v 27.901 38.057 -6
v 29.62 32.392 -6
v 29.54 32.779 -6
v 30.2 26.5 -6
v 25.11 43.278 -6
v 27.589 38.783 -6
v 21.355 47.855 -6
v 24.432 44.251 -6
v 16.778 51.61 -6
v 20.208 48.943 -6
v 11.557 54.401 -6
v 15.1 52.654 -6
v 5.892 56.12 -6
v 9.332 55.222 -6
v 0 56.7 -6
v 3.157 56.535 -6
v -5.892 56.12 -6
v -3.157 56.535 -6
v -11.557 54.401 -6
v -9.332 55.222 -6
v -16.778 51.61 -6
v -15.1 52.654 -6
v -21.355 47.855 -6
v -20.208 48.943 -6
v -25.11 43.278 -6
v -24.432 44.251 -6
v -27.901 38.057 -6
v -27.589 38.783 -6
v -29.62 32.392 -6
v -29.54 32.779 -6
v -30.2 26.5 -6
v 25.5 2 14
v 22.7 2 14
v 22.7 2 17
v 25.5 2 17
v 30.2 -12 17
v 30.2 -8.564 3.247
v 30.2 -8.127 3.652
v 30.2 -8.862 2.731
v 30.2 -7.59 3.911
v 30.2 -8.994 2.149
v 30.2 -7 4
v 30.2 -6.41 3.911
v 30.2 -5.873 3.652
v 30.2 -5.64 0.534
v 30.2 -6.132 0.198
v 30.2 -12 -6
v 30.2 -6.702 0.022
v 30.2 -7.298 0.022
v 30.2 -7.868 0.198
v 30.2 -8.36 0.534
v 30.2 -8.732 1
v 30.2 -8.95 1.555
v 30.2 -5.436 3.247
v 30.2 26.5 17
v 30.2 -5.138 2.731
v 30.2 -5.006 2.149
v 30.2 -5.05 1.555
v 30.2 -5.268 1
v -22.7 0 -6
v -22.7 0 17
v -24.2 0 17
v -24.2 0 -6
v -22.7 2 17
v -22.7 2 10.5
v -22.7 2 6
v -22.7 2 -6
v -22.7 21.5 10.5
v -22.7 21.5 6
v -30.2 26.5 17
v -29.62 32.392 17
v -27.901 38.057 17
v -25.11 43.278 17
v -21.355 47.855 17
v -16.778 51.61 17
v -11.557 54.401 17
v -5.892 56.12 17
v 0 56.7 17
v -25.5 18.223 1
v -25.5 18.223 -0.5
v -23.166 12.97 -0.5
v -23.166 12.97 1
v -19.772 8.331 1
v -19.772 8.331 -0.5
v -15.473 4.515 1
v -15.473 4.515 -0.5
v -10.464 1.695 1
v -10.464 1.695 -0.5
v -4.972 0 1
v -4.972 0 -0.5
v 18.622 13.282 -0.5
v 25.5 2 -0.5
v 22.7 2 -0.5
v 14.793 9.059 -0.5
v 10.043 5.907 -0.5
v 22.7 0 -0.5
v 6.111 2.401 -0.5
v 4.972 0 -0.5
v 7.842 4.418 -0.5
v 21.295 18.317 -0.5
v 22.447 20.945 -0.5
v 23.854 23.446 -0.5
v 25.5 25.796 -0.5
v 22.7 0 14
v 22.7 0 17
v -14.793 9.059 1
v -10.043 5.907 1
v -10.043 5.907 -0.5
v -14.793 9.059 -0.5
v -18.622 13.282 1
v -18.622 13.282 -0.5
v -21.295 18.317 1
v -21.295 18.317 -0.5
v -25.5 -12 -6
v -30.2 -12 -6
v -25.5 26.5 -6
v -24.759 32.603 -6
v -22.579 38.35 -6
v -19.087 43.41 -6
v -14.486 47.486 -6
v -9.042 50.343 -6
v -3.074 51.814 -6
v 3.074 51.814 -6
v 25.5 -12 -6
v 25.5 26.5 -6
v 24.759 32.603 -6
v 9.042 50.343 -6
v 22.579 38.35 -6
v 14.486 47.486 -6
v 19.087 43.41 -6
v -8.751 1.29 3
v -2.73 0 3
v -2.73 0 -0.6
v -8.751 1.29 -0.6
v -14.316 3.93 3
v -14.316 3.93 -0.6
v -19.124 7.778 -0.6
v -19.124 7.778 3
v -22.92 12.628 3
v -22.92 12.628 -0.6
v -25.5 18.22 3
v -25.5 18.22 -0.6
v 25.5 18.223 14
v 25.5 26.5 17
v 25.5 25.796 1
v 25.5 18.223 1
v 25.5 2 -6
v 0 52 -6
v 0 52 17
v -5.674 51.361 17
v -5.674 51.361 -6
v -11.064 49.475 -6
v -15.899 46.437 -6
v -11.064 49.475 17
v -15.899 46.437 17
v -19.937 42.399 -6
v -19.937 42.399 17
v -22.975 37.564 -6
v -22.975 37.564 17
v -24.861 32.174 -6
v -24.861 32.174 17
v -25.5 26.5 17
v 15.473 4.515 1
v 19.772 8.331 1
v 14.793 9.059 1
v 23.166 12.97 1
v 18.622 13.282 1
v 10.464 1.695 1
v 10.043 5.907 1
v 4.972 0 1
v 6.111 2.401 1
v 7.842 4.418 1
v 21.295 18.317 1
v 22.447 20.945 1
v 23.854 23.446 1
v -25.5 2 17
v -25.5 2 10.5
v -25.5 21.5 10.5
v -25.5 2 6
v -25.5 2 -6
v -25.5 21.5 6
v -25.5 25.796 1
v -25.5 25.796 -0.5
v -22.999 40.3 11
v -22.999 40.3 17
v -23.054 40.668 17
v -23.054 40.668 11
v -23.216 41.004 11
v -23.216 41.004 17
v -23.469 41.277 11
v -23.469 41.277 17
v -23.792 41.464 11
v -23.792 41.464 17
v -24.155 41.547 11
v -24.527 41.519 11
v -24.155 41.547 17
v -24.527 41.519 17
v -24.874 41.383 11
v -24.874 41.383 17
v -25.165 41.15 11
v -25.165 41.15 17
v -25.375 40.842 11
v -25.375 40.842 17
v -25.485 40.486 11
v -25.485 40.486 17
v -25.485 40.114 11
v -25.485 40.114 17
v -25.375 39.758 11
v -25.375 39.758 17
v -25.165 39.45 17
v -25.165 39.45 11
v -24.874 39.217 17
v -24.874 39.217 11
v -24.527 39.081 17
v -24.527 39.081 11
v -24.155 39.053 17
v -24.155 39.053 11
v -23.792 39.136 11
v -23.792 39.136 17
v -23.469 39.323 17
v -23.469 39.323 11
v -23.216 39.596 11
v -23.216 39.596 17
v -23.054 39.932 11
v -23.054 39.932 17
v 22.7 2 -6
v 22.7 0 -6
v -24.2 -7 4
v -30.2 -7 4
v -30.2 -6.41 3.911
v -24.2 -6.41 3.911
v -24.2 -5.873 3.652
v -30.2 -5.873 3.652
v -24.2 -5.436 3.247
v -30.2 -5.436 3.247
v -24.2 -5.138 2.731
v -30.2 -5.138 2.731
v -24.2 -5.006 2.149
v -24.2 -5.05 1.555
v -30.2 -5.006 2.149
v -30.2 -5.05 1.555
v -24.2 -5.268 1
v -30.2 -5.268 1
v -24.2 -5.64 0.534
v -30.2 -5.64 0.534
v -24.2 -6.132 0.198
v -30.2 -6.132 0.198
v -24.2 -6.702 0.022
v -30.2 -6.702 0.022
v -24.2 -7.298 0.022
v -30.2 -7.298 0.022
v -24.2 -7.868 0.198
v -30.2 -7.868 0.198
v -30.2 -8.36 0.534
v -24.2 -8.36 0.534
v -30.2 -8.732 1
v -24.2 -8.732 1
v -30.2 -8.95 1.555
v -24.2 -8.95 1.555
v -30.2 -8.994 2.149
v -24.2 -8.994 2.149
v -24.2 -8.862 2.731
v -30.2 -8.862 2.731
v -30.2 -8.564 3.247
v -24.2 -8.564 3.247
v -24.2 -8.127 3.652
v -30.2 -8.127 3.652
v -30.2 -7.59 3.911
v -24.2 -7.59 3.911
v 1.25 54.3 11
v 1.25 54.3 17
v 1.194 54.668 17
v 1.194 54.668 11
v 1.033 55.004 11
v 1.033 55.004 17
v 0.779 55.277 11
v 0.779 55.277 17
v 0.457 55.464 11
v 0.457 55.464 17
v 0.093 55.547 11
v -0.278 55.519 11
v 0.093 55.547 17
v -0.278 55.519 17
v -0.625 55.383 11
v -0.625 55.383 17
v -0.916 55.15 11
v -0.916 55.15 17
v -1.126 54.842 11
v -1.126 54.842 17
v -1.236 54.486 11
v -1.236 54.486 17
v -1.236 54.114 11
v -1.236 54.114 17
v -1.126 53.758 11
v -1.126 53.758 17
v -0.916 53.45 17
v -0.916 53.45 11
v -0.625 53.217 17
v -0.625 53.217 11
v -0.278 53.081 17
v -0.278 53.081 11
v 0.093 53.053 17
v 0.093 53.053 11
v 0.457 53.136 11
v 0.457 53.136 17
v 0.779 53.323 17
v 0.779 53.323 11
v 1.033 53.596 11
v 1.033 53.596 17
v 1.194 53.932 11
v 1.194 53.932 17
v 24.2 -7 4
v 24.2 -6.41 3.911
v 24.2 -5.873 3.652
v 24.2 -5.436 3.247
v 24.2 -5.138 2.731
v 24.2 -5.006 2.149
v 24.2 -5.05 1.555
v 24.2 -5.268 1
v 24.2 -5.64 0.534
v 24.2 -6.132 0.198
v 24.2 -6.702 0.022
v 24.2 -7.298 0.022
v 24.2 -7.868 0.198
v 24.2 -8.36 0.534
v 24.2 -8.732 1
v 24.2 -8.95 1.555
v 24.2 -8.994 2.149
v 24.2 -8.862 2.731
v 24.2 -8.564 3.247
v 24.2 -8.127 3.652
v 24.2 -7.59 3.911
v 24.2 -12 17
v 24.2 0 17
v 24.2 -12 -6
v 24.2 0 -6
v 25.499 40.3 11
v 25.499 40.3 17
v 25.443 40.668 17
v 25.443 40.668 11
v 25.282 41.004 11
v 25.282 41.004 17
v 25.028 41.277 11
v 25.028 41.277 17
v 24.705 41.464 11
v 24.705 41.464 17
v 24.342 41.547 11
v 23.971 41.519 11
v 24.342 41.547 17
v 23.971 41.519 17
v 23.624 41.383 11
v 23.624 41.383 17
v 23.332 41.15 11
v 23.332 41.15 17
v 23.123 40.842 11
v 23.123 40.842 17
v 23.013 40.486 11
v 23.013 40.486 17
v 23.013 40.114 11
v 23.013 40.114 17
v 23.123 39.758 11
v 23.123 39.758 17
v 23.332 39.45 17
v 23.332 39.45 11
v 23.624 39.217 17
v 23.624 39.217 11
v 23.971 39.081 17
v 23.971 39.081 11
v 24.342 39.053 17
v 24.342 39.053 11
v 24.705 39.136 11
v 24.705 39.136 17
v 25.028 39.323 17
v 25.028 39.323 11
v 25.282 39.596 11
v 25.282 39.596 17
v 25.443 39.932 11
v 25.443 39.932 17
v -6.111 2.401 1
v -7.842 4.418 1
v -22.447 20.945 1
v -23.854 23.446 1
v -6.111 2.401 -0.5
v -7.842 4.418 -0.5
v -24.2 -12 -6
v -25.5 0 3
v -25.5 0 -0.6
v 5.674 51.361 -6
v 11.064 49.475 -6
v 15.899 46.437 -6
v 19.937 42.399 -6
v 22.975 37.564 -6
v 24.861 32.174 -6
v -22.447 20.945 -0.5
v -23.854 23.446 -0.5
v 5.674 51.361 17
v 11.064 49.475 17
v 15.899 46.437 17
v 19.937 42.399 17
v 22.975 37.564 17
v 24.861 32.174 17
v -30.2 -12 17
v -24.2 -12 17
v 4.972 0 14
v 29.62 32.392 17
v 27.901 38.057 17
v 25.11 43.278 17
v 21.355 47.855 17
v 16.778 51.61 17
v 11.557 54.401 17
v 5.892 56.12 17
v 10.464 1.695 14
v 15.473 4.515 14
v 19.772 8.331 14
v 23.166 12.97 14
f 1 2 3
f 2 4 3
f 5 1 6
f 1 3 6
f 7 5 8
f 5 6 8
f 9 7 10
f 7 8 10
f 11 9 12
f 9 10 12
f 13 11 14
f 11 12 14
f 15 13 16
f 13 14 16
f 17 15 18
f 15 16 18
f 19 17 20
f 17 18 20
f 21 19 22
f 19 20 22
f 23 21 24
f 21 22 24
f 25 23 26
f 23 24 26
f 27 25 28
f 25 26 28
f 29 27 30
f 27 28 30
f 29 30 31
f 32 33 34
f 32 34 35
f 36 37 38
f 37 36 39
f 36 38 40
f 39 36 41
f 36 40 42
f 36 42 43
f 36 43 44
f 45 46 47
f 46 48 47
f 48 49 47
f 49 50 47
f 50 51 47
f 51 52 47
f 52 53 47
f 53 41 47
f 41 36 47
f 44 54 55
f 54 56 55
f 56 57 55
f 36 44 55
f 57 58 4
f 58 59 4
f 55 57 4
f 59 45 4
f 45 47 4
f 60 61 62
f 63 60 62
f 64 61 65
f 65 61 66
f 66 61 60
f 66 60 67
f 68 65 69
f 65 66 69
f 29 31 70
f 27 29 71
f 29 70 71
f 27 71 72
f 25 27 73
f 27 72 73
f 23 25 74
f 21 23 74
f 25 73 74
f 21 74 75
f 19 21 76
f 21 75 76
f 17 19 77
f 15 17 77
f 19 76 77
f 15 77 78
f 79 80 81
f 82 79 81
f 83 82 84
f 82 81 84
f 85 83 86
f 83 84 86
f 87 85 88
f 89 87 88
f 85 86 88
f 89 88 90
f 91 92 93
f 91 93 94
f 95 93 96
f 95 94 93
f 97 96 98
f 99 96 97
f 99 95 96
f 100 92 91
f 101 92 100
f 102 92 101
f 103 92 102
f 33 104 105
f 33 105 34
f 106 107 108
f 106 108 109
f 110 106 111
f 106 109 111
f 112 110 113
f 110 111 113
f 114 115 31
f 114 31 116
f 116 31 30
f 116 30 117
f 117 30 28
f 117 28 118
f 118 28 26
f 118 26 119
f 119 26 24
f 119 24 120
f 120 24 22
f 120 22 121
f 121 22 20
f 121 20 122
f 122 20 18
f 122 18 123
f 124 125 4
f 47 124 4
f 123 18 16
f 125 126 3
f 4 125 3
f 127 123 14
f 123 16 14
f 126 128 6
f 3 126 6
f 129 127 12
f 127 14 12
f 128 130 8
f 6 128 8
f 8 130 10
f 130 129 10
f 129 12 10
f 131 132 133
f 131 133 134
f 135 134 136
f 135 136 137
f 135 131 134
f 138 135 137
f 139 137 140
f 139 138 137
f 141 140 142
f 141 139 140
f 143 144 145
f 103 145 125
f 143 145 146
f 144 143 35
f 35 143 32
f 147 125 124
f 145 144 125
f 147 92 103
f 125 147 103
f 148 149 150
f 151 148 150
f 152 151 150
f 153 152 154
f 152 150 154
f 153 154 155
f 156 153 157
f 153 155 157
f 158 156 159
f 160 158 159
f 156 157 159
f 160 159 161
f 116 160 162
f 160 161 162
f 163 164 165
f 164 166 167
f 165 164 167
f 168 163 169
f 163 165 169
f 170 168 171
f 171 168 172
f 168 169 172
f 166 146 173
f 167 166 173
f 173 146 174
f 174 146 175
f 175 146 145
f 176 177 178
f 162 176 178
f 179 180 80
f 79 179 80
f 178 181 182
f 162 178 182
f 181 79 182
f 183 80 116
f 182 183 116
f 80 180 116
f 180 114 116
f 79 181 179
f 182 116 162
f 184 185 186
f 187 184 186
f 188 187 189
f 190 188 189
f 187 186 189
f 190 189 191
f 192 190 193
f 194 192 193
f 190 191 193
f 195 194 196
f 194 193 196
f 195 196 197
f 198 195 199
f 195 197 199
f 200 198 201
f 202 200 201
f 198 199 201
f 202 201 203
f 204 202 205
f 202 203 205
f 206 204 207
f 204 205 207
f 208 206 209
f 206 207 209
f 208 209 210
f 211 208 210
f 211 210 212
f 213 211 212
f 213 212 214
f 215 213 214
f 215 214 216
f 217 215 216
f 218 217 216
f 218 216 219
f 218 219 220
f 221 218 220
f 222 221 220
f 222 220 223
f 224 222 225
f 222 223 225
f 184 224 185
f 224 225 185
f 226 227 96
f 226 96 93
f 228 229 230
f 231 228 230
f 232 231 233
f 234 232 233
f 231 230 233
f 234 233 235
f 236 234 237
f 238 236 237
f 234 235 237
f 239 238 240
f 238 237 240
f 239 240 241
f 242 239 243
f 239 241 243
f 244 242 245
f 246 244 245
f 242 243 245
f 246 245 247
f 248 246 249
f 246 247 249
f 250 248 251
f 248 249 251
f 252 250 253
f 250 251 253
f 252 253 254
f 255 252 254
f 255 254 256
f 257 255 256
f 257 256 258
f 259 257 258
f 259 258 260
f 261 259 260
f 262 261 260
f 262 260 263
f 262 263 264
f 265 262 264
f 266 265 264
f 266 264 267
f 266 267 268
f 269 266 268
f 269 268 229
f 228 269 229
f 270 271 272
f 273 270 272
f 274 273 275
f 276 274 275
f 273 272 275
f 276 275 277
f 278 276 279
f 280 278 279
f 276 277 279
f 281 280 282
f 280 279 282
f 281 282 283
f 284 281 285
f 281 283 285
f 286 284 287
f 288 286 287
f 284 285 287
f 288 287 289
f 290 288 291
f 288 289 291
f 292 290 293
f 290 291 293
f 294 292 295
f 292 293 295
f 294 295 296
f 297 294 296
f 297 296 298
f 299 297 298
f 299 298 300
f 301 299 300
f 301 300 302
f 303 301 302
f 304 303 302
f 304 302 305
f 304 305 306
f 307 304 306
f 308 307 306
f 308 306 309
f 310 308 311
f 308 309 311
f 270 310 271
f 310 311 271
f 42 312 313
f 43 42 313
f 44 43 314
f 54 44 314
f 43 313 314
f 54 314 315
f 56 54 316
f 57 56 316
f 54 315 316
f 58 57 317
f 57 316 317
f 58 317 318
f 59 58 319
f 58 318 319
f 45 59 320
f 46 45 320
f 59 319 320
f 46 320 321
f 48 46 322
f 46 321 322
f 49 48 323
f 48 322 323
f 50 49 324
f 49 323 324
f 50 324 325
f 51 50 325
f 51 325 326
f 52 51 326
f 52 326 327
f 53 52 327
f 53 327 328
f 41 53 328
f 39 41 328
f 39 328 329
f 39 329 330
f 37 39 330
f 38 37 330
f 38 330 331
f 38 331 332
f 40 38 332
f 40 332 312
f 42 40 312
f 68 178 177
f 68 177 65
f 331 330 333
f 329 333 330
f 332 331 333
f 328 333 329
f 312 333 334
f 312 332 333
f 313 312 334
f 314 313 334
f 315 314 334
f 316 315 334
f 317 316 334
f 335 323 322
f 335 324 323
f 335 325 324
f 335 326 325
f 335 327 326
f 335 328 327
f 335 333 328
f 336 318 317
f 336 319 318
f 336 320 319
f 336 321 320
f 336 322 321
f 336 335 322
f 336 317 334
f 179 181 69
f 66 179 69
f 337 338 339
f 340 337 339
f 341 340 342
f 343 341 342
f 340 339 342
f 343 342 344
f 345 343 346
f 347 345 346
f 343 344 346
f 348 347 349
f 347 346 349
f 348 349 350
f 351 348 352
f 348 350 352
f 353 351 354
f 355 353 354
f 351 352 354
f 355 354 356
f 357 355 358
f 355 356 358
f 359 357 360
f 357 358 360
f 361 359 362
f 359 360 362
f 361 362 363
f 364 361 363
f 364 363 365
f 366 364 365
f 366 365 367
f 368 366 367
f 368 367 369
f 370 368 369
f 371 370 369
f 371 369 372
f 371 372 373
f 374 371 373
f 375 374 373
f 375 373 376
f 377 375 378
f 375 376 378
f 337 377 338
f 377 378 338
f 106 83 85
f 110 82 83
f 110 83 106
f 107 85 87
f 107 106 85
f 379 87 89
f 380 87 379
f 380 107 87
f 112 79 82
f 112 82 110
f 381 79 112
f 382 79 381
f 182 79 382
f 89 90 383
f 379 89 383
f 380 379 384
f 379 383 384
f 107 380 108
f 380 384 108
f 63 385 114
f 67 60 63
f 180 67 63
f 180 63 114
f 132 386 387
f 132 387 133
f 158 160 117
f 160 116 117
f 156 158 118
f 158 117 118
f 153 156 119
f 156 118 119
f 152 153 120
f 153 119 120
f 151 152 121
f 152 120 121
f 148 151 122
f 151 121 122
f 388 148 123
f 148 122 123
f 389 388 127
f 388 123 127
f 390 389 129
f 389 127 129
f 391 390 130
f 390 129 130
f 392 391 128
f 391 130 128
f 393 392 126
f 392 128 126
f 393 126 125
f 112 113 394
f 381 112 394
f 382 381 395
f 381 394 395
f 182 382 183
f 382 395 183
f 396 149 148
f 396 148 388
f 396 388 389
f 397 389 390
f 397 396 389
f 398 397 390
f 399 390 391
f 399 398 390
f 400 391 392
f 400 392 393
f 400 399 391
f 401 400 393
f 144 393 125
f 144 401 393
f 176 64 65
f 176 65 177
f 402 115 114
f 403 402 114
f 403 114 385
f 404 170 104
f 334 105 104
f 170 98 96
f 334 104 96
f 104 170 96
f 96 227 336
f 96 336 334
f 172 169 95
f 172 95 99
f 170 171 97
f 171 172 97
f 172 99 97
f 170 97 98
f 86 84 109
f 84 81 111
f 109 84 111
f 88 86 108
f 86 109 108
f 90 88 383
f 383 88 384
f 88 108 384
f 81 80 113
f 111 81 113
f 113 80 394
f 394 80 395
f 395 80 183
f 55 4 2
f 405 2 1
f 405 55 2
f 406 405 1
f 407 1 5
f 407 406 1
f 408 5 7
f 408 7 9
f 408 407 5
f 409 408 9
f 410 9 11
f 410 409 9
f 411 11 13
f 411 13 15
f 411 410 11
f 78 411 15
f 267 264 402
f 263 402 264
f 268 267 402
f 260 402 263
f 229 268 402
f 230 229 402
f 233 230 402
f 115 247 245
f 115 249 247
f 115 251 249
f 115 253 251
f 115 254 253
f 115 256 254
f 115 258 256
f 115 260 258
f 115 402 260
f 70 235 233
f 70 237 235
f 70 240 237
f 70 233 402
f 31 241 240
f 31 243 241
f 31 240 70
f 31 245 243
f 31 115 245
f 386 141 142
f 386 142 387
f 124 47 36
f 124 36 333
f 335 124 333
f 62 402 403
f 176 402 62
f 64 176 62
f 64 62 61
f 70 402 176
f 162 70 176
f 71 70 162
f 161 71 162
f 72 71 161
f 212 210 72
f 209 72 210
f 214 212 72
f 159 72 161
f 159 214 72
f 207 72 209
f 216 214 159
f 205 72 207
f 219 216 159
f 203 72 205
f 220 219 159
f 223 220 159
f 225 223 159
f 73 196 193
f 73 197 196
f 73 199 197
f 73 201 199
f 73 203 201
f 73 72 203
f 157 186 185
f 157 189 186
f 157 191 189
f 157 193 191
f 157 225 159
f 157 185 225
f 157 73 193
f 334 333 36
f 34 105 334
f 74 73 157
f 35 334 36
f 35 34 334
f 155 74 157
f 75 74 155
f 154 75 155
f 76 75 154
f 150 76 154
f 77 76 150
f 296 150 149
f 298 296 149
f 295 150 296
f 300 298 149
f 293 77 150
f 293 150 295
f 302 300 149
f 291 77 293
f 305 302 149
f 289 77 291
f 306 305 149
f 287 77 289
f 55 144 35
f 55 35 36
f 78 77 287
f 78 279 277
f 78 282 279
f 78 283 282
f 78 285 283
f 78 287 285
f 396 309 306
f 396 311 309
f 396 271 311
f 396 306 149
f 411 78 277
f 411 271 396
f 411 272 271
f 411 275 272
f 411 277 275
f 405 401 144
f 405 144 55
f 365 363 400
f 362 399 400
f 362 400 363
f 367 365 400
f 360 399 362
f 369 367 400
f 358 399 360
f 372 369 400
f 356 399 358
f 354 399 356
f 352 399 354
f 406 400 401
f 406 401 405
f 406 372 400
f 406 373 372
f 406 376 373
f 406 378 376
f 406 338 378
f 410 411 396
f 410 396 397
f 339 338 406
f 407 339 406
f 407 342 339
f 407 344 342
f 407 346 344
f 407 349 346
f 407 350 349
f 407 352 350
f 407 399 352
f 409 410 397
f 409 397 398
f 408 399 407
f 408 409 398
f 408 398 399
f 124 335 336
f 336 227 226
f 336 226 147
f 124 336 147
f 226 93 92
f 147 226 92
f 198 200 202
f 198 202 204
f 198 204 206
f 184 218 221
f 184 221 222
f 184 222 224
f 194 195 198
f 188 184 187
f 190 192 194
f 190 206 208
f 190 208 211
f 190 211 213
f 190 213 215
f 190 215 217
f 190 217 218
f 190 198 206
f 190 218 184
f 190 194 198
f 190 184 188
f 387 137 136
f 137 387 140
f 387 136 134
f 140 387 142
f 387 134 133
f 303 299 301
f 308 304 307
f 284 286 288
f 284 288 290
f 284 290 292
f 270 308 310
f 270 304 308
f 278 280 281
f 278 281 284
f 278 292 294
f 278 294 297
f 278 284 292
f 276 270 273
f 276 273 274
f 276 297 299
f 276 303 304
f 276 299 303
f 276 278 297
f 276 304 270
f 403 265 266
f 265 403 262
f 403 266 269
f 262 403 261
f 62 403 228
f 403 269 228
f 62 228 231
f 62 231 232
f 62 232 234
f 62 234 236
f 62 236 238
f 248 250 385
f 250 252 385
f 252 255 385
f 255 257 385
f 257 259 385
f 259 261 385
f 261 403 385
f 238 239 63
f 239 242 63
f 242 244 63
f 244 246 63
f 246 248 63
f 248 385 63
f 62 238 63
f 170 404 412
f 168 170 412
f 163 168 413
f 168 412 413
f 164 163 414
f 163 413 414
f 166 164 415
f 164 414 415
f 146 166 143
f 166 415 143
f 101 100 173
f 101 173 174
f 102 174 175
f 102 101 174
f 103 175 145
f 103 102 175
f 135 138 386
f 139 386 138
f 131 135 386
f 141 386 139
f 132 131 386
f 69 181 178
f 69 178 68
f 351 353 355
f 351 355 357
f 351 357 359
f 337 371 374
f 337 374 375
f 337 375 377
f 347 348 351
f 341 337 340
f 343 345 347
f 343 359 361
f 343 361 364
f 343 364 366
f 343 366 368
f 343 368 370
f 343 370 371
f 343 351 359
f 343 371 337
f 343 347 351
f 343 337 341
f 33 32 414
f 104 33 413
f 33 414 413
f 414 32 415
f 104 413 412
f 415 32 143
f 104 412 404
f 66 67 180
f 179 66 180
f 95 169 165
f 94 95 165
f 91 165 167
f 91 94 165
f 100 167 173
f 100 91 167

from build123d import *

# Parameters (mm, degrees)
BOSS_EXTRUDE1_DEPTH      = 8
BOSS_EXTRUDE2_DEPTH      = 6
BOSS_EXTRUDE2_DEPTH_BACK = 17
BOSS_EXTRUDE3_START      = 0.0001
BOSS_EXTRUDE3_DEPTH      = 0.0001
SKETCH6_W                = 6
SKETCH6_H                = 10
BOSS_EXTRUDE4_DEPTH      = 15
CUT_EXTRUDE6_START       = -10
CUT_EXTRUDE6_DEPTH       = 10
CUT_EXTRUDE1_REACH       = 90.809
SKETCH3_R                = 2
SKETCH9_W                = 2.8
SKETCH9_H                = 2
BOSS_EXTRUDE5_DEPTH      = 23
SKETCH10_W               = 3
SKETCH10_H               = 10
CUT_EXTRUDE7_DEPTH       = 15
SKETCH11_W               = 15
SKETCH11_H               = 10
CUT_EXTRUDE8_DEPTH       = 65
SKETCH15_W               = 2.8
SKETCH15_H               = 4.5
BOSS_EXTRUDE7_DEPTH      = 19.5
BOSS_EXTRUDE8_START      = -20
BOSS_EXTRUDE8_DEPTH      = 14.5
BOSS_EXTRUDE11_START     = -9
BOSS_EXTRUDE11_DEPTH     = 3.6
SKETCH19_R               = 1.25
CUT_EXTRUDE11_DEPTH      = 6
BOSS_EXTRUDE12_DEPTH     = 1.5
FILLET3_R                = 10
FILLET3_OF_MIRROR7_R     = 10


with BuildPart() as part:
    # Sketch1 → Boss-Extrude1 (new body)
    with BuildSketch(Plane.XY):
        with BuildLine():
            Line((22.5, 0), (22.5, 26.5))
            ThreePointArc((22.5, 26.5), (15.909902577, 42.409902577), (0, 49))
            Line((0, 49), (0, 52))
            ThreePointArc((0, 52), (18.03122292, 44.53122292), (25.5, 26.5))
            Line((25.5, 26.5), (25.5, 0))
            Line((25.5, 0), (22.5, 0))
        make_face()
    boss_extrude1 = extrude(amount=BOSS_EXTRUDE1_DEPTH)

    # Mirror1: Boss-Extrude1 across plane
    add(boss_extrude1.mirror(Plane(origin=(0, 52, 8), x_dir=(0, 0, 1), z_dir=(1, 0, 0))))

    # Sketch7 → Cut-Extrude6 (cut)
    with BuildSketch(Plane.XY.offset(8).offset(CUT_EXTRUDE6_START)):
        with BuildLine():
            Line((-22.5, 26.5), (-22.5, 18.310669729))
            Line((-22.5, 18.310669729), (-22.5, -2))
            Line((-22.5, -2), (-25.5, -2))
            Line((-25.5, -2), (-25.5, 18.310669729))
            Line((-25.5, 18.310669729), (-25.5, 26.5))
            ThreePointArc((-25.5, 26.5), (0, 52), (25.5, 26.5))
            Line((25.5, 26.5), (25.5, 0))
            Line((25.5, 0), (22.5, 0))
            Line((22.5, 0), (22.5, 26.5))
            ThreePointArc((22.5, 26.5), (0, 49), (-22.5, 26.5))
        make_face()
    extrude(amount=CUT_EXTRUDE6_DEPTH, mode=Mode.SUBTRACT)


with BuildPart() as body_2:
    # Sketch2 → Boss-Extrude2 (new, two sides: drawn at the far end of the back side and taken through both)
    with BuildSketch(Plane(origin=(0, 0, 0), x_dir=(-1, 0, 0), z_dir=(0, 0, -1)).offset(-BOSS_EXTRUDE2_DEPTH_BACK)):
        with BuildLine():
            Line((24.2, 0), (24.2, -12))
            Line((24.2, -12), (30.2, -12))
            Line((30.2, -12), (30.2, 26.5))
            ThreePointArc((30.2, 26.5), (21.354624792, 47.854624792), (0, 56.7))
            Line((0, 56.7), (0, 52))
            ThreePointArc((0, 52), (18.03122292, 44.53122292), (25.5, 26.5))
            Line((25.5, 26.5), (25.5, 0))
            Line((25.5, 0), (24.2, 0))
        make_face()
    extrude(amount=BOSS_EXTRUDE2_DEPTH + BOSS_EXTRUDE2_DEPTH_BACK)


with BuildPart() as body_3:
    # Mirror3: mirrored copy
    add(body_2.part.mirror(Plane(origin=(0, 56.7, 17), x_dir=(0, 0, 1), z_dir=(1, 0, 0))))


with BuildPart() as body_2_1:
    add(body_2.part)

    add(body_3.part)  # Boss-Extrude3 merges body 3
    # Sketch5 → Boss-Extrude3 (add)
    with BuildSketch(Plane(origin=(0, 0, -6), x_dir=(-1, 0, 0), z_dir=(0, 0, -1)).offset(BOSS_EXTRUDE3_START)):
        with BuildLine():
            Line((25.5, -12), (25.5, 26.5))
            ThreePointArc((25.5, 26.5), (0, 52), (-25.5, 26.5))
            Line((-25.5, 26.5), (-25.5, -12))
            Line((-25.5, -12), (-30.2, -12))
            Line((-30.2, -12), (-30.2, 26.5))
            ThreePointArc((-30.2, 26.5), (0, 56.7), (30.2, 26.5))
            Line((30.2, 26.5), (30.2, -12))
            Line((30.2, -12), (25.5, -12))
        make_face()
    extrude(amount=-BOSS_EXTRUDE3_DEPTH)

    # Sketch6 → Boss-Extrude4 (add)
    with BuildSketch(Plane.XY.offset(17)):
        with Locations((-27.2, -7)):
            Rectangle(SKETCH6_W, SKETCH6_H)
    boss_extrude4 = extrude(amount=BOSS_EXTRUDE4_DEPTH)

    # Mirror4: Boss-Extrude4 across plane
    add(boss_extrude4.mirror(Plane(origin=(0, 0, 0), x_dir=(0, 0, 1), z_dir=(1, 0, 0))))

    # Mirror5: Boss-Extrude4 across plane
    add(boss_extrude4.mirror(Plane(origin=(0, 0, 0), x_dir=(0, 0, 1), z_dir=(1, 0, 0))))

    # Sketch3 → Cut-Extrude1 (cut, up to next)
    with BuildSketch(Plane.ZY.offset(30.2), mode=Mode.PRIVATE) as cut_extrude1_sk1:
        with Locations((29.9999, -7)):
            Circle(SKETCH3_R)
    cut_extrude1_tool1 = extrude(cut_extrude1_sk1.sketch, amount=-CUT_EXTRUDE1_REACH, mode=Mode.PRIVATE) & body_2_1.part
    # Sketch3 → Cut-Extrude1 (cut, up to next)
    with BuildSketch(Plane.ZY.offset(30.2), mode=Mode.PRIVATE) as cut_extrude1_sk2:
        with Locations((1.9999, -7)):
            Circle(SKETCH3_R)
    cut_extrude1_tool2 = extrude(cut_extrude1_sk2.sketch, amount=-CUT_EXTRUDE1_REACH, mode=Mode.PRIVATE) & body_2_1.part
    add(cut_extrude1_tool1.solids().sort_by_distance((-30.2, -7, 29.9999))[0], mode=Mode.SUBTRACT)
    add(cut_extrude1_tool1.solids().sort_by_distance((-30.2, -7, 29.9999))[1], mode=Mode.SUBTRACT)
    add(cut_extrude1_tool2.solids().sort_by_distance((-30.2, -7, 1.9999))[0], mode=Mode.SUBTRACT)
    add(cut_extrude1_tool2.solids().sort_by_distance((-30.2, -7, 1.9999))[1], mode=Mode.SUBTRACT)

    # Sketch9 → Boss-Extrude5 (add)
    with BuildSketch(Plane(origin=(0, 0, -6), x_dir=(-1, 0, 0), z_dir=(0, 0, -1))):
        with Locations((24.1, 1)):
            Rectangle(SKETCH9_W, SKETCH9_H)
    boss_extrude5 = extrude(amount=-BOSS_EXTRUDE5_DEPTH)

    # Mirror6: Boss-Extrude5 across plane
    add(boss_extrude5.mirror(Plane(origin=(0, 0, 0), x_dir=(0, 0, 1), z_dir=(1, 0, 0))))

    # Sketch10 → Cut-Extrude7 (cut)
    with BuildSketch(Plane.XY.offset(32)):
        with Locations((25.7, -7)):
            Rectangle(SKETCH10_W, SKETCH10_H)
    extrude(amount=-CUT_EXTRUDE7_DEPTH, mode=Mode.SUBTRACT)

    # Sketch11 → Cut-Extrude8 (cut)
    with BuildSketch(Plane.ZY.offset(30.2)):
        with Locations((24.5, -7)):
            Rectangle(SKETCH11_W, SKETCH11_H)
    extrude(amount=-CUT_EXTRUDE8_DEPTH, mode=Mode.SUBTRACT)

    # Sketch15 → Boss-Extrude7 (add)
    with BuildSketch(Plane(origin=(0, 2, 0), x_dir=(1, 0, 0), z_dir=(0, 1, 0))):
        with Locations((-24.1, -8.25)):
            Rectangle(SKETCH15_W, SKETCH15_H)
    extrude(amount=BOSS_EXTRUDE7_DEPTH)

    # Sketch16 → Boss-Extrude8 (add)
    with BuildSketch(Plane(origin=(0, 0, -6.0001), x_dir=(-1, 0, 0), z_dir=(0, 0, -1)).offset(BOSS_EXTRUDE8_START)):
        with BuildLine():
            Line((-25.5, 0), (-4.972040216, 0))
            ThreePointArc((-4.972040216, 0), (-17.724548794, 6.308156337), (-25.5, 18.222923222))
            Line((-25.5, 18.222923222), (-25.5, 0))
        make_face()
    extrude(amount=BOSS_EXTRUDE8_DEPTH)

    # Sketch19 → Cut-Extrude11 (cut)
    with BuildSketch(Plane.XY.offset(17)):
        with Locations((0, 54.3)):
            Circle(SKETCH19_R)
        with Locations((24.248711306, 40.3)):
            Circle(SKETCH19_R)
        with Locations((-24.248711306, 40.3)):
            Circle(SKETCH19_R)
    extrude(amount=-CUT_EXTRUDE11_DEPTH, mode=Mode.SUBTRACT)

    # Sketch21 → Boss-Extrude12 (add)
    with BuildSketch(Plane(origin=(0, 0, -0.5001), x_dir=(-1, 0, 0), z_dir=(0, 0, -1))):
        with BuildLine():
            Line((-25.5, 25.795756465), (-25.5, 18.222923222))
            ThreePointArc((-25.5, 18.222923222), (-17.724548794, 6.308156337), (-4.972040216, 0))
            Line((-4.972040216, 0), (-4.972040216, 4.089065169))
            ThreePointArc((-4.972040216, 4.089065169), (-14.912780115, 9.162068255), (-21.295198222, 18.317307692))
            ThreePointArc((-21.295198222, 18.317307692), (-23.119512448, 22.212887939), (-25.5, 25.795756465))
        make_face()
    boss_extrude12 = extrude(amount=-BOSS_EXTRUDE12_DEPTH)

    # Fillet3
    # the kernel refuses this fillet: 10 mm, written as the material it takes off along each edge
    with BuildSketch(Plane(origin=(4.972040216, 4.089065169, -13.967602165), x_dir=(0.9413494118920093, 0.33743337821052655, 0), z_dir=(0, 0, 1))) as fillet3_piece_1:
        with BuildLine():
            CenterArc((6.558088011, -9.931191011), FILLET3_R, 96.725267466, 45.815614847)
            Line((-1.379787074, -3.849239092), (-1.538544575, -3.727600054))
            ThreePointArc((-1.538544575, -3.727600054), (-0.878163419, -1.85713287), (-0.188269882, 0.067486676))
            Line((-0.188269882, 0.067486676), (0.023421743, 0.19862382))
            ThreePointArc((0.023421743, 0.19862382), (2.693500433, 0.041739326), (5.363579123, 0.19862382))
            Line((5.363579123, 0.19862382), (5.387000866, 0))
        make_face()
    extrude(amount=28.435004329, mode=Mode.SUBTRACT)

    # Mirror7: Boss-Extrude12 across plane
    add(boss_extrude12.mirror(Plane(origin=(0, 0, 0), x_dir=(0, 0, 1), z_dir=(1, 0, 0))))

    # Fillet3 of Mirror7
    # the kernel refuses this fillet: 10 mm, written as the material it takes off along each edge
    with BuildSketch(Plane(origin=(-4.972040216, 4.089065169, -13.967602165), x_dir=(0, -1, 0), z_dir=(0, 0, 1))) as fillet3_of_mirror7_piece_1:
        with BuildLine():
            CenterArc((7.135803026, -9.524567624), FILLET3_OF_MIRROR7_R, 107.738539154, 45.815614847)
            Line((-1.817753901, -5.071050097), (-1.996825039, -4.981979746))
            ThreePointArc((-1.996825039, -4.981979746), (-0.94816824, -2.521440807), (-0.194877694, 0.044974263))
            Line((-0.194877694, 0.044974263), (0, 0.2))
            ThreePointArc((0, 0.2), (2.044532584, 0.2), (4.028130412, 0.190491352))
            Line((4.028130412, 0.190491352), (4.089065169, 0))
        make_face()
    extrude(amount=28.435004329, mode=Mode.SUBTRACT)


with BuildPart() as body_2_2:
    # Sketch18 → Boss-Extrude11 (new body)
    with BuildSketch(Plane(origin=(0, 0, -6.0001), x_dir=(-1, 0, 0), z_dir=(0, 0, -1)).offset(BOSS_EXTRUDE11_START)):
        with BuildLine():
            Line((25.5, 18.22), (25.5, 0))
            Line((25.5, 0), (2.729505874, 0))
            ThreePointArc((2.729505874, 0), (16.83167007, 5.714525488), (25.5, 18.22))
        make_face()
    extrude(amount=BOSS_EXTRUDE11_DEPTH)


solid = Compound([body_2_1.part, body_2_2.part])
